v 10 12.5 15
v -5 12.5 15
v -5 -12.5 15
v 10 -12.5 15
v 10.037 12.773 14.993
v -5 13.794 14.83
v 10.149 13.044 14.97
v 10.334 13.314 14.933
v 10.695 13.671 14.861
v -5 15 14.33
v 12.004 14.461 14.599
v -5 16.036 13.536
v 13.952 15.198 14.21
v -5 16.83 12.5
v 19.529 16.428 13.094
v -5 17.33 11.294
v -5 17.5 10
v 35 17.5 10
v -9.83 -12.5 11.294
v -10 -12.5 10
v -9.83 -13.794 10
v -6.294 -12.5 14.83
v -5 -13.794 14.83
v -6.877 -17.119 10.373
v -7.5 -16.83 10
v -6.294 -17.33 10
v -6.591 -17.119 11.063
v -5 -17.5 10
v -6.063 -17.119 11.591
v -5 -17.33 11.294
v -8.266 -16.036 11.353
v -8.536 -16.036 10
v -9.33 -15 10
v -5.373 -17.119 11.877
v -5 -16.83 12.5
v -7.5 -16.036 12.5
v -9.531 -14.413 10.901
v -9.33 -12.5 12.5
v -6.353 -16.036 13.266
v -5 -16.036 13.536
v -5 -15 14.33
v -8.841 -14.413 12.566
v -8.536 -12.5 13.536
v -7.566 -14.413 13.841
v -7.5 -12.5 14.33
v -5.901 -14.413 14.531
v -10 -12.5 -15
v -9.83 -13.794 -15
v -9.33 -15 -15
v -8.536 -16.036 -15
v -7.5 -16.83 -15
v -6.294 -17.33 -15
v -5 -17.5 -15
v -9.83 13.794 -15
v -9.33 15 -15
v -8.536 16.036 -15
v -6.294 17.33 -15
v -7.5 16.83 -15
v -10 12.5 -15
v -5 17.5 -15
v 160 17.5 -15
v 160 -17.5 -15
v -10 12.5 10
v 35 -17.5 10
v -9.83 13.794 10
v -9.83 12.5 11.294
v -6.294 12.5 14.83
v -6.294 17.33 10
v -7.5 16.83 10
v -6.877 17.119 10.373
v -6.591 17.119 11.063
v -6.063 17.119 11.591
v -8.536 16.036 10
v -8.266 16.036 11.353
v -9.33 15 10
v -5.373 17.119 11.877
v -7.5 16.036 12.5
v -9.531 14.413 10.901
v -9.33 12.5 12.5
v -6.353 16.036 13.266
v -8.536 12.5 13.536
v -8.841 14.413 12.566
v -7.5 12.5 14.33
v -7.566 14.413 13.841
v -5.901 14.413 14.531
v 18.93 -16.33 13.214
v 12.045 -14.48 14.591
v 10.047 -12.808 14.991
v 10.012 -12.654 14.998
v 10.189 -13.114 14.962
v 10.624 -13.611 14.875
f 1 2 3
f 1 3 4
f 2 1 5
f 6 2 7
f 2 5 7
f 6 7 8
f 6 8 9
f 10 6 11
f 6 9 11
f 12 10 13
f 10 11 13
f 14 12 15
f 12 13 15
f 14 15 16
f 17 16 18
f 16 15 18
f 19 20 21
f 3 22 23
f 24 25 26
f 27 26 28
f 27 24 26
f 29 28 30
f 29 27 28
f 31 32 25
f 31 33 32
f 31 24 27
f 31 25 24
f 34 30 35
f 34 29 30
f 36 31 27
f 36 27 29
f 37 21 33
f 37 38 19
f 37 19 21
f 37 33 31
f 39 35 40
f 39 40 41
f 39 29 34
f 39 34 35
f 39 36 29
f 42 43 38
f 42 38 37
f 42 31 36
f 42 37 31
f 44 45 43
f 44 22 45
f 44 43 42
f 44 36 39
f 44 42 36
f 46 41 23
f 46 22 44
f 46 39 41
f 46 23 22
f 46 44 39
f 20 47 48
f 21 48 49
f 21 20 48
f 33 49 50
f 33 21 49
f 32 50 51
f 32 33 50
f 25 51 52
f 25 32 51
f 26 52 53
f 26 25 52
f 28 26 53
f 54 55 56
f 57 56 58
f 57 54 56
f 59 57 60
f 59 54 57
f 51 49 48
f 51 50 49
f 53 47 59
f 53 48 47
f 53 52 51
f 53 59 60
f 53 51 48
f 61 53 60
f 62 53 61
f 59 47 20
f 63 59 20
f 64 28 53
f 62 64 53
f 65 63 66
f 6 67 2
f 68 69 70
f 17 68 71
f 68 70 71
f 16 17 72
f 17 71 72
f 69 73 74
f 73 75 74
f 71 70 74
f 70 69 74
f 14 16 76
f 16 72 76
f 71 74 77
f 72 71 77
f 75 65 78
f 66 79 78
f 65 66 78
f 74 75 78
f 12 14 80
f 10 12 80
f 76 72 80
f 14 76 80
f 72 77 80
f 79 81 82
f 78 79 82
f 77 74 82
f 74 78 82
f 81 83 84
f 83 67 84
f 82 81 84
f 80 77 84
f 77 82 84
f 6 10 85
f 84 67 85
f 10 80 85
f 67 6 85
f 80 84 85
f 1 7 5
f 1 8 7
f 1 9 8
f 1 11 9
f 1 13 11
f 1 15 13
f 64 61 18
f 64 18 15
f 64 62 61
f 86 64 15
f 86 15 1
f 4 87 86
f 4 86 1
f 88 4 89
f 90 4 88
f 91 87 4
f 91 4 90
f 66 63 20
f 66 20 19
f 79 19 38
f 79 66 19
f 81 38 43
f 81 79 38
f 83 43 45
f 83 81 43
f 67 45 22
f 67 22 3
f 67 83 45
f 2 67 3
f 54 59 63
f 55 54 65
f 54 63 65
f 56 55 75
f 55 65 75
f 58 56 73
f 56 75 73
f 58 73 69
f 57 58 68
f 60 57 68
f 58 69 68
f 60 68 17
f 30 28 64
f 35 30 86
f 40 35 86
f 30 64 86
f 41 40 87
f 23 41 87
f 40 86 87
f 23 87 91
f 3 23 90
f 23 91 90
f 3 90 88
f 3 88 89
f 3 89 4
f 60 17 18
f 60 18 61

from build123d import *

# Parameters (mm, degrees)
F0_W     = 20
F0_H     = 30
F1_DEPTH = 17.5
F2_R     = 5


with BuildPart() as f1:
    # F0 (on Front) → F1 (new body, symmetric)
    with BuildSketch(Plane.XZ):
        Rectangle(F0_W, F0_H)
        Polygon((160, -15), (10, 15), (10, -15), align=None)
    extrude(amount=F1_DEPTH, both=True)

    # F2
    f2_edges = [f1.edges().sort_by_distance(p)[0] for p in [
        (-10, 0, 15),
        (-10, -17.5, 0),
        (-10, 17.5, 0),
        (0, -17.5, 15),
        (0, 17.5, 15),
    ]]
    fillet(f2_edges, radius=F2_R)


solid = f1.part
